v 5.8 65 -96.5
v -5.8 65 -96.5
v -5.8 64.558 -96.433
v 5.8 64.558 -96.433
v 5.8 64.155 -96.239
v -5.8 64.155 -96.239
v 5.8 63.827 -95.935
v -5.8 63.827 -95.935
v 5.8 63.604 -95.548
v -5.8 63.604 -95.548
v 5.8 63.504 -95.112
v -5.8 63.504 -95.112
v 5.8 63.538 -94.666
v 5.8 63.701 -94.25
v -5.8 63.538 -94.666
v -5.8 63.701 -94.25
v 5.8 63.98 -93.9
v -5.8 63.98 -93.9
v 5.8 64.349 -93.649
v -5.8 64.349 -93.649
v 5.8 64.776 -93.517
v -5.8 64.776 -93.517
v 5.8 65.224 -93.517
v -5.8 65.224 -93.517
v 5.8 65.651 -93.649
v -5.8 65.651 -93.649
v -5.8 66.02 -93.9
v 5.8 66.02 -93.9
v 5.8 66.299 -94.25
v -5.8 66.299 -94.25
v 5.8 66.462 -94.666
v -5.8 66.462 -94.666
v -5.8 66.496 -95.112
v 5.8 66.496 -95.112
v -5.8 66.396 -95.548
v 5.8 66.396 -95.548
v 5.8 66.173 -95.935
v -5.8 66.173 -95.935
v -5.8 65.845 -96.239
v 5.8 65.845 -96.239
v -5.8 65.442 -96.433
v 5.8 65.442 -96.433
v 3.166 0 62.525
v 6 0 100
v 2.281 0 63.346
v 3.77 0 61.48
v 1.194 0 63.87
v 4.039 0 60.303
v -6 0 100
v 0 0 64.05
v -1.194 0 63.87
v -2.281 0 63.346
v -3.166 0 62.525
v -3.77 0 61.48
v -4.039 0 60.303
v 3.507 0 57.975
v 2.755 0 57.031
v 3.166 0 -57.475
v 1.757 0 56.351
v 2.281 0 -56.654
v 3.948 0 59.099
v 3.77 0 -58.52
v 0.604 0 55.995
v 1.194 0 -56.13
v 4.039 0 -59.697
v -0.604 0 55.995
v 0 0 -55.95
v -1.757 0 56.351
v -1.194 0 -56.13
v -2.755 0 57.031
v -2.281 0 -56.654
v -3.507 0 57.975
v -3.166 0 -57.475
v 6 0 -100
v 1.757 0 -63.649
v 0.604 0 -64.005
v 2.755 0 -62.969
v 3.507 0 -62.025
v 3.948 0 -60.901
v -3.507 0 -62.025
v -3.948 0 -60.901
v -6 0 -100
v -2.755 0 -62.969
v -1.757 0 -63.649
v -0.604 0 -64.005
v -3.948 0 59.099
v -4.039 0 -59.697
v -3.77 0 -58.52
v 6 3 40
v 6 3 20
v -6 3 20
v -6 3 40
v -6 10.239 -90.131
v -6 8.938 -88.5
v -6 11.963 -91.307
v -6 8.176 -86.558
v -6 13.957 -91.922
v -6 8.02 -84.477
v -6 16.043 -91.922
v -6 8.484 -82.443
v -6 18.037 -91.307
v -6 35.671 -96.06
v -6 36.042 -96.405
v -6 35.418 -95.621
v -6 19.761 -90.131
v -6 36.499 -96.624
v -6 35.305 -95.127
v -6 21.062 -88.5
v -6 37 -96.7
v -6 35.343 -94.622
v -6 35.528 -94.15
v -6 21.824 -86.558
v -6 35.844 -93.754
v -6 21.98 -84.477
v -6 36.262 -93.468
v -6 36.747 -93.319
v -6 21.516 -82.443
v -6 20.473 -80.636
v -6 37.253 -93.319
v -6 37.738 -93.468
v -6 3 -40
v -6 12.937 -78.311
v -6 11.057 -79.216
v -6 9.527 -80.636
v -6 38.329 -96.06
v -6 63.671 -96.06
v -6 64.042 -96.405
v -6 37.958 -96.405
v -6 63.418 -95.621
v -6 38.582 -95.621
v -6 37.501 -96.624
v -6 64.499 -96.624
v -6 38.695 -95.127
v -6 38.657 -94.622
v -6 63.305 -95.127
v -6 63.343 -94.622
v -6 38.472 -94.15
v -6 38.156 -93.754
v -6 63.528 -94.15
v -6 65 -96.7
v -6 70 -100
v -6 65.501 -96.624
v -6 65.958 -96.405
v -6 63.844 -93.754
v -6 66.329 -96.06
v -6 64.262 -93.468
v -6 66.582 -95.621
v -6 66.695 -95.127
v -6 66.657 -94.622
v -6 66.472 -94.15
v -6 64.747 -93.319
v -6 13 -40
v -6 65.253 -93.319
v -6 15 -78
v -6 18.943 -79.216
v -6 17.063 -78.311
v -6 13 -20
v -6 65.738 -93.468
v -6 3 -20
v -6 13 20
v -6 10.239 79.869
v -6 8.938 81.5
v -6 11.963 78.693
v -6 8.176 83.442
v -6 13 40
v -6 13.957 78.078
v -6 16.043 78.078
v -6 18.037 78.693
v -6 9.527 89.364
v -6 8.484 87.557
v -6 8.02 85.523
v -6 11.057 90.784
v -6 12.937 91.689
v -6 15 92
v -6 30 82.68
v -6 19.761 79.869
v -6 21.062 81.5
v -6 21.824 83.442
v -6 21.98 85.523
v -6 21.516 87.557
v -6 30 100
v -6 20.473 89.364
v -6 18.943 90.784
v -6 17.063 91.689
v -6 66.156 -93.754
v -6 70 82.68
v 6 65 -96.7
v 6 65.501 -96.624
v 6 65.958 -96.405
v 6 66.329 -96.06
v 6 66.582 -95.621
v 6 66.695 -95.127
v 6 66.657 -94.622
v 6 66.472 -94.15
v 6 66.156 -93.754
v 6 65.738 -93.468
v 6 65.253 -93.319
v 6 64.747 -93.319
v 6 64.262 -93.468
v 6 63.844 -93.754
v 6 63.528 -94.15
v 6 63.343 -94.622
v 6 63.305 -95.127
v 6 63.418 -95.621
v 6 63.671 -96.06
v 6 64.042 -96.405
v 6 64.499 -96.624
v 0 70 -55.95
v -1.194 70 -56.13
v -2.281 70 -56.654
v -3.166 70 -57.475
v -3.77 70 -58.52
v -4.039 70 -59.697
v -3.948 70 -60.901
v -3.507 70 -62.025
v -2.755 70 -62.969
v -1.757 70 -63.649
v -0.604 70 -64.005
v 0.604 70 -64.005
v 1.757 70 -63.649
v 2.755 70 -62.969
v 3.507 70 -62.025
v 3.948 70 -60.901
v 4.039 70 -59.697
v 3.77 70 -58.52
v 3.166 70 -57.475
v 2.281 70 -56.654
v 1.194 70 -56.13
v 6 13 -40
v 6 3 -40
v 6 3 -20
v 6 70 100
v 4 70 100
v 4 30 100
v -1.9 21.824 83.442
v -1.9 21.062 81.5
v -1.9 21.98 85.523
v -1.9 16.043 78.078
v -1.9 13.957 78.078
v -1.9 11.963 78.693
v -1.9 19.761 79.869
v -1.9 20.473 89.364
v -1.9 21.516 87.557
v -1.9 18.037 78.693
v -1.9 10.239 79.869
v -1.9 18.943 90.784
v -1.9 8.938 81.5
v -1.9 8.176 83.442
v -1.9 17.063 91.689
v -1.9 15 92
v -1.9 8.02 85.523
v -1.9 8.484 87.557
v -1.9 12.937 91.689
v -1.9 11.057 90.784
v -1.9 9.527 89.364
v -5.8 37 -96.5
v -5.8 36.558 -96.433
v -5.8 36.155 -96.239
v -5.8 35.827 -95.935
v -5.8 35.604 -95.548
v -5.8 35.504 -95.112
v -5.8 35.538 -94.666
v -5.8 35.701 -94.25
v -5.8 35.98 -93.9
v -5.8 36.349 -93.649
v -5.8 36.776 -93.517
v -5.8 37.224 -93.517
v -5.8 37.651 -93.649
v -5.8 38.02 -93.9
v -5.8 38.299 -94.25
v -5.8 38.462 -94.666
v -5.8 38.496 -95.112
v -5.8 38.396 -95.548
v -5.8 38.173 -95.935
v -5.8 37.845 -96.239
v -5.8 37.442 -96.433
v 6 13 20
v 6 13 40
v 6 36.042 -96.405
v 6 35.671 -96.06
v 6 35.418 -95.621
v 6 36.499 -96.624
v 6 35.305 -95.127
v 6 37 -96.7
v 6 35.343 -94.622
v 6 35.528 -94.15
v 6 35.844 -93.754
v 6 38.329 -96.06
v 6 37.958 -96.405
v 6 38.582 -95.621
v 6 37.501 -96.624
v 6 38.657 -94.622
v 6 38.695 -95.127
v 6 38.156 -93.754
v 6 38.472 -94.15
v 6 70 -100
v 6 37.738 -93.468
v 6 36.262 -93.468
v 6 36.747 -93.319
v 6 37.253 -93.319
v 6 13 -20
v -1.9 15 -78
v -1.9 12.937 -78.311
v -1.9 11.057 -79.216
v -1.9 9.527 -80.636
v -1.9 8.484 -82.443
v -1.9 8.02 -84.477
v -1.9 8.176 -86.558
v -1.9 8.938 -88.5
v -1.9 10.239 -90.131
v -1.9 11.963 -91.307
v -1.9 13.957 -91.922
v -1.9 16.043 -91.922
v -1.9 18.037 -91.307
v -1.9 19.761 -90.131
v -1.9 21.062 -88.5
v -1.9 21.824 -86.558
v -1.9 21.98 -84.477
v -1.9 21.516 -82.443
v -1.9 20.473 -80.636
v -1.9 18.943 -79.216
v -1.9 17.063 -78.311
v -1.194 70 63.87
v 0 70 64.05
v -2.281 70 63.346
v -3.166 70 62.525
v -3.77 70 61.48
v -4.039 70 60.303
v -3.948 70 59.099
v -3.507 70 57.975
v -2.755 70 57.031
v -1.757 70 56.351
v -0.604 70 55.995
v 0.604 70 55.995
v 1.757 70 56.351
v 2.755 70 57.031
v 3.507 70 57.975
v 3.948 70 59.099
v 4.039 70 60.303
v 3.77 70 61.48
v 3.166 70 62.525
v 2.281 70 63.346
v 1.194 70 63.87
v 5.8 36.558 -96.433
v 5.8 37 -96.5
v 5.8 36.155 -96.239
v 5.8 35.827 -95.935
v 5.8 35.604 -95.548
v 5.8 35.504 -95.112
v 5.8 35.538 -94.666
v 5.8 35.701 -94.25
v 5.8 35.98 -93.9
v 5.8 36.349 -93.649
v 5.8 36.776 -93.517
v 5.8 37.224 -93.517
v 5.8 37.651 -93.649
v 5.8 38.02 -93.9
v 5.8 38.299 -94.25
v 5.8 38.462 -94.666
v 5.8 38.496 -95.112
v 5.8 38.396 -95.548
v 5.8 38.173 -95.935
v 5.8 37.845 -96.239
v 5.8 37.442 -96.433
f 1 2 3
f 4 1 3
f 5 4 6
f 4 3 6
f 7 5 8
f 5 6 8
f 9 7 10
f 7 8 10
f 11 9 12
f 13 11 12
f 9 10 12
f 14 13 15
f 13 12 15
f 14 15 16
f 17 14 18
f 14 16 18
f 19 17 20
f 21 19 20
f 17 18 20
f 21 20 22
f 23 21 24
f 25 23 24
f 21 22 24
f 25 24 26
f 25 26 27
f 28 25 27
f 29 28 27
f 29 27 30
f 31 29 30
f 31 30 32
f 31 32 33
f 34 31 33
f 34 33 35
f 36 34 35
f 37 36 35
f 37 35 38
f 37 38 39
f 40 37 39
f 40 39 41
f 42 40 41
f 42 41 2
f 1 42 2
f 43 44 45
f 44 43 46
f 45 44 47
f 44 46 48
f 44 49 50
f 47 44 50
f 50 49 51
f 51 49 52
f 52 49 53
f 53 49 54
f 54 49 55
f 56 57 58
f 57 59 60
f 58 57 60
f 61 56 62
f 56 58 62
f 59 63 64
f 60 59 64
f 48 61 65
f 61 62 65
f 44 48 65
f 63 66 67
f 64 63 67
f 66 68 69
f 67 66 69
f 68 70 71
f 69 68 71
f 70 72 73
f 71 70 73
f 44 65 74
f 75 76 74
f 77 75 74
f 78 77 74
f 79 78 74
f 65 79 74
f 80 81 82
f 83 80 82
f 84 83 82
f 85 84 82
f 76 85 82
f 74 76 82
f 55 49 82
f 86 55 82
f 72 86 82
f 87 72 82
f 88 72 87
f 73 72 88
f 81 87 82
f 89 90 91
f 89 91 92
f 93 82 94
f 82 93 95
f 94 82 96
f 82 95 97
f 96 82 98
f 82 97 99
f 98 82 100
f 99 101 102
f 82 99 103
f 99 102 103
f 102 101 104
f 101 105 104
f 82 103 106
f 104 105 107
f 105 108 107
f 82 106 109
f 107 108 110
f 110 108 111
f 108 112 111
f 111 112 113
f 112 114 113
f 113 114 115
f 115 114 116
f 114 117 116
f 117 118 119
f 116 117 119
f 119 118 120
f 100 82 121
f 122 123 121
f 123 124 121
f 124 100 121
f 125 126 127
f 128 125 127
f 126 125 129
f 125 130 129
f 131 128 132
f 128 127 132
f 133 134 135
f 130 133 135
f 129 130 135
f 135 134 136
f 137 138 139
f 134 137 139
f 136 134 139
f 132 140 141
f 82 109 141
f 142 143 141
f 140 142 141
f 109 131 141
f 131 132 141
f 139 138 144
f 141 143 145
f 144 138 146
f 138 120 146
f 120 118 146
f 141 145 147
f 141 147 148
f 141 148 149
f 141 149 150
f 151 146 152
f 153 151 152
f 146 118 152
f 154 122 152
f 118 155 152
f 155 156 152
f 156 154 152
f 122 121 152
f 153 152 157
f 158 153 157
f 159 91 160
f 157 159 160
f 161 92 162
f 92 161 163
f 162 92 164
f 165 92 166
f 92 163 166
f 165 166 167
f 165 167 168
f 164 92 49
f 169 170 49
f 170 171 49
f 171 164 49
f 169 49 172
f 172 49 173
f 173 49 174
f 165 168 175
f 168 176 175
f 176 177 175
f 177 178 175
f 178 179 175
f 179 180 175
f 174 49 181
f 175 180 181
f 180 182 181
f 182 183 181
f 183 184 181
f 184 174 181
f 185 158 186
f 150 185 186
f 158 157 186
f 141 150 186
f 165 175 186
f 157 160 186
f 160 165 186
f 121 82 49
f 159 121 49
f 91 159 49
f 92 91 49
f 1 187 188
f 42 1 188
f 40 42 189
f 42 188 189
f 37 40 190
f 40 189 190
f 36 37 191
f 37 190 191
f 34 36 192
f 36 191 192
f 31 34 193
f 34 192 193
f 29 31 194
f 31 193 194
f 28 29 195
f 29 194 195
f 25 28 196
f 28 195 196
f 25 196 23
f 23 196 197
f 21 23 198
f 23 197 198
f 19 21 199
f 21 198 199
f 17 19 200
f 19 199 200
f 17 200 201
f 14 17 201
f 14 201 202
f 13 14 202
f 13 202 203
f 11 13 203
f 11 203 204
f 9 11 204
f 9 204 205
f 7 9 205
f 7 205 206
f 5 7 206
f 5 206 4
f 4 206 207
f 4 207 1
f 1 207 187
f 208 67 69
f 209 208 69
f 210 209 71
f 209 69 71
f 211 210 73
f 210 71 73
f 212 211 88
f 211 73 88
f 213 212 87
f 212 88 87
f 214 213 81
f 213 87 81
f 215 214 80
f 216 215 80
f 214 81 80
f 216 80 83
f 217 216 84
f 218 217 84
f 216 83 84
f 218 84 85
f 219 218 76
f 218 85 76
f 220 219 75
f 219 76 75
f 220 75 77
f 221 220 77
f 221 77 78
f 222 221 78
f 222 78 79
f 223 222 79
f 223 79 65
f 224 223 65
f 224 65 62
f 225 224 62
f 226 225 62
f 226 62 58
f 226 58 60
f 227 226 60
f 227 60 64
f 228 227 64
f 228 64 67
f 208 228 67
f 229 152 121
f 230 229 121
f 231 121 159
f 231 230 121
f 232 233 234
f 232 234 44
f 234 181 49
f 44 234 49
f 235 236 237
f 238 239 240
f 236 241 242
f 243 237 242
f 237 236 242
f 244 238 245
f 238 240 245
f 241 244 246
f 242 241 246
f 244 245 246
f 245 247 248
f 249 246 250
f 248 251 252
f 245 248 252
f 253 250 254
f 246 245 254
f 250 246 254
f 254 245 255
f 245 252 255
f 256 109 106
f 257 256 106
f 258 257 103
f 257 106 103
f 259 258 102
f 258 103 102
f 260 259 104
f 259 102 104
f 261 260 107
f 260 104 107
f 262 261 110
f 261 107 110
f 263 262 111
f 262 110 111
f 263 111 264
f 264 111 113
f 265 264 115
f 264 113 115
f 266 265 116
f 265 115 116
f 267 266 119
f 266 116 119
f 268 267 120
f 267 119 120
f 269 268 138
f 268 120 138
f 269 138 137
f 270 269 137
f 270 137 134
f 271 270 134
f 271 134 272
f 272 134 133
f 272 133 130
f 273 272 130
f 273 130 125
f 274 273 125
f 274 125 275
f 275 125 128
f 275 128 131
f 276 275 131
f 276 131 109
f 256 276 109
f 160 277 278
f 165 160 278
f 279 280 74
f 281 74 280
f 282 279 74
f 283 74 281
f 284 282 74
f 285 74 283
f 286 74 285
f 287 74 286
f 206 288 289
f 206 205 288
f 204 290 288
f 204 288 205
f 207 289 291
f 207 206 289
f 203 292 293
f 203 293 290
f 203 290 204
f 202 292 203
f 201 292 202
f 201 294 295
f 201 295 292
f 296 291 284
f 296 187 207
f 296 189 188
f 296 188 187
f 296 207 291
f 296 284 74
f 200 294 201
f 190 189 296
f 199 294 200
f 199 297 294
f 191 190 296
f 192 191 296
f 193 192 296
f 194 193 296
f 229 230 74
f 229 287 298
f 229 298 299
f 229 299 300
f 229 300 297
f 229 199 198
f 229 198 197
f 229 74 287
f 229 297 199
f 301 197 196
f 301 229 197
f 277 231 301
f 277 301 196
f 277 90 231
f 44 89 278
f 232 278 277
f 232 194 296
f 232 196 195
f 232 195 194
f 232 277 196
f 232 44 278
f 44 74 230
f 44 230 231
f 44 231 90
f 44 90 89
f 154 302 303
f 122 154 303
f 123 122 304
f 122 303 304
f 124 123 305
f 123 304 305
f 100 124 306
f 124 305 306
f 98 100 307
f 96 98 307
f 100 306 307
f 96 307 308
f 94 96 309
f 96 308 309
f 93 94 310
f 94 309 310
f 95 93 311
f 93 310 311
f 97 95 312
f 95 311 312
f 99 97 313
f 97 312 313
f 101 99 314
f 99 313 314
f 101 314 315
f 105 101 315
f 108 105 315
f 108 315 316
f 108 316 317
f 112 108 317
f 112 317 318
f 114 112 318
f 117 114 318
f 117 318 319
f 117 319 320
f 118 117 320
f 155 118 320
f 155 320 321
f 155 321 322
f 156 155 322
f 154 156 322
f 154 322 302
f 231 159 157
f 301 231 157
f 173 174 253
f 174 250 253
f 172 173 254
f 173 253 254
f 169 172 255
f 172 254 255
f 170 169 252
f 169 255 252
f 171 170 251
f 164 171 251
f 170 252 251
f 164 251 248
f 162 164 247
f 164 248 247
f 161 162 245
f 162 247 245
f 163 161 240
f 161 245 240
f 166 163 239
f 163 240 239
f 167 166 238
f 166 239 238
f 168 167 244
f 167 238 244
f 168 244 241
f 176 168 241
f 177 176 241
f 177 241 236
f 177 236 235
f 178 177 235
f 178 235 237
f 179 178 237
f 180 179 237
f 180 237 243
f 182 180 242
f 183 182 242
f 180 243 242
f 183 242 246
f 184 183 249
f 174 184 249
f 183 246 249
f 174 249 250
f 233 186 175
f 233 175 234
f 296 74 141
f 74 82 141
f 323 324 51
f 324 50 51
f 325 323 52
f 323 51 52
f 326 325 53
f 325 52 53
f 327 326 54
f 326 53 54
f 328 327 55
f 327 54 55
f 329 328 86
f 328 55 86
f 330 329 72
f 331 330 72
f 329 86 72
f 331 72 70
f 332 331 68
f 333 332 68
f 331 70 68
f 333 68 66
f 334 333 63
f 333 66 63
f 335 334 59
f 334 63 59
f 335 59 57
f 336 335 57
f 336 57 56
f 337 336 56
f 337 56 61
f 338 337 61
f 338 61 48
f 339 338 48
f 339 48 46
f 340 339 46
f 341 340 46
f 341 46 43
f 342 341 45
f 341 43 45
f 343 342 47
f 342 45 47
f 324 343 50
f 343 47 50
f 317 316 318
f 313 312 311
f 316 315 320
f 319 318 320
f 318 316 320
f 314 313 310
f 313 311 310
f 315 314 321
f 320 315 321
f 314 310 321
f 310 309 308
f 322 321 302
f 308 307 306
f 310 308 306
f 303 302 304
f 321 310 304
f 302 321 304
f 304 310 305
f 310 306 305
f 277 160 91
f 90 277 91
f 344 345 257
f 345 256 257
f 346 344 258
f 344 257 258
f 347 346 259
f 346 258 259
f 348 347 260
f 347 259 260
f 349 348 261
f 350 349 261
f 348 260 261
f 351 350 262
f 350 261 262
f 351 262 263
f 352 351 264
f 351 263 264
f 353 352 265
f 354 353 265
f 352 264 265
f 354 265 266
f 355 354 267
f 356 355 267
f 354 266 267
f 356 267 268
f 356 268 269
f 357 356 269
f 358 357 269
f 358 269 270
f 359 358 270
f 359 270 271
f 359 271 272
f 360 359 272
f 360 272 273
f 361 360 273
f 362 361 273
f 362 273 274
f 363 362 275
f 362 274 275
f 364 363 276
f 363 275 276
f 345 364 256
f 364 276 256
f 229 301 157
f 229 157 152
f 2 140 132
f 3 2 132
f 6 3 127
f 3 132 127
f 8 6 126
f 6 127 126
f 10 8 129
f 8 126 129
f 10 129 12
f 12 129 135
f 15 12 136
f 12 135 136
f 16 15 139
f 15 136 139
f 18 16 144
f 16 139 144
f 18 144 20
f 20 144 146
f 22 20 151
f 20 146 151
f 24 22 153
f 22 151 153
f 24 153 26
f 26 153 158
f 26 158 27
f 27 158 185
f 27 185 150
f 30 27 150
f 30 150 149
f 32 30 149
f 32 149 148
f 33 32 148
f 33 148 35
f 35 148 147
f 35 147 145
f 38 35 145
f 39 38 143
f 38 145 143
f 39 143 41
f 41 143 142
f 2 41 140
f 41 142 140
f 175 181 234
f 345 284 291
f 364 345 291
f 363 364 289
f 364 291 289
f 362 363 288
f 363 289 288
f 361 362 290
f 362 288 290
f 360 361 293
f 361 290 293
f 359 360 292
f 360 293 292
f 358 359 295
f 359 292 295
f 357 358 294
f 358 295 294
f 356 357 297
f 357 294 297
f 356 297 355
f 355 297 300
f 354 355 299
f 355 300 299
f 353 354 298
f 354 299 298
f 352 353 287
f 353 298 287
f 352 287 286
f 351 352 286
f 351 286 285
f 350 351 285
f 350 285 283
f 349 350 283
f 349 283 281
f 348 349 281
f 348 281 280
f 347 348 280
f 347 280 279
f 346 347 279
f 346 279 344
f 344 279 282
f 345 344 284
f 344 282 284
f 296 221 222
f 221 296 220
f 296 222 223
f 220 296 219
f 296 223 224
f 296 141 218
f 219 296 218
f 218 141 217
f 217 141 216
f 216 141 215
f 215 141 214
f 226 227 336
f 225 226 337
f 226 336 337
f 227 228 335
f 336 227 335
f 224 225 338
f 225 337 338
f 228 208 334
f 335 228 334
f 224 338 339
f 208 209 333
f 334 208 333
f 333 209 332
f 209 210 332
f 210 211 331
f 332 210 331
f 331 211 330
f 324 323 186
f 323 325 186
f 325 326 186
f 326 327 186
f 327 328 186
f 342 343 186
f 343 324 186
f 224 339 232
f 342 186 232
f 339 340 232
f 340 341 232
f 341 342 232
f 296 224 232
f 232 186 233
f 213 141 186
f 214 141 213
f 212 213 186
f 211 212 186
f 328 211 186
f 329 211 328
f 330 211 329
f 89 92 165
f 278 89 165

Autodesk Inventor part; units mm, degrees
ref_plane "YZ Plane" through (0, 0, 0) normal (1, 0, 0) x (0, 1, 0)
ref_plane "XZ Plane" through (0, 0, 0) normal (0, 1, 0) x (-1, 0, 0)
ref_plane "XY Plane" through (0, 0, 0) normal (0, 0, 1) x (1, 0, 0)
sketch "Эскиз1" plane through (0, 0, 0) normal (1, 0, 0) x (0, 1, 0)
  line L0 (0, 100) -> (0, -100)
  line L1 (0, -100) -> (30, -100)
  line L2 (30, -100) -> (30, 100)
  line L3 (30, 100) -> (0, 100)
  line L4 (-14, 0) -> (84, 0) construction
  line L5 (0, -140) -> (0, 140) construction
  line L6 (30, -100) -> (70, -100)
  line L7 (70, -100) -> (70, 100)
  line L8 (70, 100) -> (30, 100)
  line L9 (30, 100) -> (30, -100)
  point P0 (0, 0)
  point P1 (30, 100)
  dimension "d0" = 200
  dimension "d1" = 30
  dimension "d2" = 200
  dimension "d3" = 40
extrude "Выдавливание1" add sketch "Эскиз1" along normal mid plane 12
sketch "Эскиз2" plane through (6, 0, 0) normal (1, 0, 0) x (0, 0, -1)
  line L0 (-20, 13) -> (-40, 13)
  line L1 (-100, 0) -> (100, 0) construction
  line L2 (100, 0) -> (100, 70) projected
  line L3 (-40, 13) -> (-20, 13)
  line L4 (-20, 13) -> (-20, 3)
  line L5 (-20, 3) -> (-40, 3)
  line L6 (-40, 3) -> (-40, 13)
  line L7 (20, 13) -> (40, 13)
  line L8 (40, 13) -> (40, 3)
  line L9 (40, 3) -> (20, 3)
  line L10 (20, 3) -> (20, 13)
  point P0 (0, 0)
  point P1 (-85, 0)
  point P2 (57.0517, 0.6179)
  dimension "d26" = 10
  dimension "d27" = 20
  dimension "d28" = 3
  dimension "d29" = 20
  dimension "d31" = 20
  dimension "d34" = 3
  dimension "d35" = 10
  dimension "d36" = 20
extrude "Выдавливание2" cut sketch "Эскиз2" against normal blind 12
sketch "Эскиз3" plane through (-6, 0, 0) normal (1, 0, 0) x (0, 0, -1)
  line L0 (100, 0) -> (100, 70) projected
  line L1 (100, 0) -> (-100, 0) projected
  line L2 (-100, 0) -> (-100, 70) projected
  point P0 (0, 0)
  point P1 (-85, 15)
  point P2 (-85, 0)
  point P3 (-85, 15)
  point P4 (85, 15)
  point P5 (-100, 15)
  dimension "d17" = 15
  dimension "d53" = 15
  dimension "d54" = 15
hole "Отверстие1" at (-6, 15, -85) at (-6, 15, 85) direction (1, 0, 0) diameter 14 depth 4.1
sketch "Эскиз4" plane through (6, 0, 0) normal (1, 0, 0) x (0, 0, -1)
  line L0 (100, 70) -> (-100, 70) projected
  line L1 (-100, 70) -> (-100, 0) projected
  line L2 (90, 30) -> (-85, 30) projected
  line L3 (100, 0) -> (100, 70) projected
  line L4 (100, 0) -> (-100, 0) projected
  point P0 (0, 0)
  point P1 (95, 65)
  point P2 (95, 37)
  point P3 (-100, 15)
  point P4 (-85, 0)
  dimension "d37" = 5
  dimension "d40" = 5
  dimension "d51" = 5
  dimension "d52" = 37
hole "Отверстие2" at (6, 65, -95) at (6, 37, -95) direction (-1, 0, 0) diameter 3 depth 70
chamfer "Фаска1" distance 0.2 angle 45 4 edges at (6, 37, -93.5) (6, 65, -93.5) (-6, 37, -93.5) (-6, 65, -93.5)
sketch "Эскиз5" plane through (-6, 70, 100) normal (0, 1, 0) x (1, 0, 0)
  line L0 (0, 0) -> (0, 200) projected
  line L1 (0, 17.3205) -> (10, 0)
  line L2 (12, 0) -> (0, 0) projected
  line L3 (0, 0) -> (10, 0)
  line L4 (0, 0) -> (0, 17.3205)
  point P0 (6, 100)
  dimension "d55" = 60
  dimension "d56" = 10
extrude "Выдавливание3" cut sketch "Эскиз5" against normal blind 40
sketch "Эскиз6" plane through (-6, 70, -100) normal (0, 1, 0) x (1, 0, 0)
  line L0 (0, 0) -> (12, 0) projected
  line L1 (10, -200) -> (0, -200) projected
  line L2 (0, -182.6795) -> (0, 0) projected
  point P0 (6, -100)
  point P1 (6, -40)
  point P2 (6, -160)
  dimension "d60" = 40
  dimension "d61" = 40
  dimension "d62" = 6
  dimension "d63" = 6
hole "Отверстие3" at (0, 70, -60) at (0, 70, 60) direction (0, -1, 0) diameter 8.1 depth 80
equation "\"d40\" = d37"
equation "\"d63\" = d62"
properties part number "Стенка конвейера"
